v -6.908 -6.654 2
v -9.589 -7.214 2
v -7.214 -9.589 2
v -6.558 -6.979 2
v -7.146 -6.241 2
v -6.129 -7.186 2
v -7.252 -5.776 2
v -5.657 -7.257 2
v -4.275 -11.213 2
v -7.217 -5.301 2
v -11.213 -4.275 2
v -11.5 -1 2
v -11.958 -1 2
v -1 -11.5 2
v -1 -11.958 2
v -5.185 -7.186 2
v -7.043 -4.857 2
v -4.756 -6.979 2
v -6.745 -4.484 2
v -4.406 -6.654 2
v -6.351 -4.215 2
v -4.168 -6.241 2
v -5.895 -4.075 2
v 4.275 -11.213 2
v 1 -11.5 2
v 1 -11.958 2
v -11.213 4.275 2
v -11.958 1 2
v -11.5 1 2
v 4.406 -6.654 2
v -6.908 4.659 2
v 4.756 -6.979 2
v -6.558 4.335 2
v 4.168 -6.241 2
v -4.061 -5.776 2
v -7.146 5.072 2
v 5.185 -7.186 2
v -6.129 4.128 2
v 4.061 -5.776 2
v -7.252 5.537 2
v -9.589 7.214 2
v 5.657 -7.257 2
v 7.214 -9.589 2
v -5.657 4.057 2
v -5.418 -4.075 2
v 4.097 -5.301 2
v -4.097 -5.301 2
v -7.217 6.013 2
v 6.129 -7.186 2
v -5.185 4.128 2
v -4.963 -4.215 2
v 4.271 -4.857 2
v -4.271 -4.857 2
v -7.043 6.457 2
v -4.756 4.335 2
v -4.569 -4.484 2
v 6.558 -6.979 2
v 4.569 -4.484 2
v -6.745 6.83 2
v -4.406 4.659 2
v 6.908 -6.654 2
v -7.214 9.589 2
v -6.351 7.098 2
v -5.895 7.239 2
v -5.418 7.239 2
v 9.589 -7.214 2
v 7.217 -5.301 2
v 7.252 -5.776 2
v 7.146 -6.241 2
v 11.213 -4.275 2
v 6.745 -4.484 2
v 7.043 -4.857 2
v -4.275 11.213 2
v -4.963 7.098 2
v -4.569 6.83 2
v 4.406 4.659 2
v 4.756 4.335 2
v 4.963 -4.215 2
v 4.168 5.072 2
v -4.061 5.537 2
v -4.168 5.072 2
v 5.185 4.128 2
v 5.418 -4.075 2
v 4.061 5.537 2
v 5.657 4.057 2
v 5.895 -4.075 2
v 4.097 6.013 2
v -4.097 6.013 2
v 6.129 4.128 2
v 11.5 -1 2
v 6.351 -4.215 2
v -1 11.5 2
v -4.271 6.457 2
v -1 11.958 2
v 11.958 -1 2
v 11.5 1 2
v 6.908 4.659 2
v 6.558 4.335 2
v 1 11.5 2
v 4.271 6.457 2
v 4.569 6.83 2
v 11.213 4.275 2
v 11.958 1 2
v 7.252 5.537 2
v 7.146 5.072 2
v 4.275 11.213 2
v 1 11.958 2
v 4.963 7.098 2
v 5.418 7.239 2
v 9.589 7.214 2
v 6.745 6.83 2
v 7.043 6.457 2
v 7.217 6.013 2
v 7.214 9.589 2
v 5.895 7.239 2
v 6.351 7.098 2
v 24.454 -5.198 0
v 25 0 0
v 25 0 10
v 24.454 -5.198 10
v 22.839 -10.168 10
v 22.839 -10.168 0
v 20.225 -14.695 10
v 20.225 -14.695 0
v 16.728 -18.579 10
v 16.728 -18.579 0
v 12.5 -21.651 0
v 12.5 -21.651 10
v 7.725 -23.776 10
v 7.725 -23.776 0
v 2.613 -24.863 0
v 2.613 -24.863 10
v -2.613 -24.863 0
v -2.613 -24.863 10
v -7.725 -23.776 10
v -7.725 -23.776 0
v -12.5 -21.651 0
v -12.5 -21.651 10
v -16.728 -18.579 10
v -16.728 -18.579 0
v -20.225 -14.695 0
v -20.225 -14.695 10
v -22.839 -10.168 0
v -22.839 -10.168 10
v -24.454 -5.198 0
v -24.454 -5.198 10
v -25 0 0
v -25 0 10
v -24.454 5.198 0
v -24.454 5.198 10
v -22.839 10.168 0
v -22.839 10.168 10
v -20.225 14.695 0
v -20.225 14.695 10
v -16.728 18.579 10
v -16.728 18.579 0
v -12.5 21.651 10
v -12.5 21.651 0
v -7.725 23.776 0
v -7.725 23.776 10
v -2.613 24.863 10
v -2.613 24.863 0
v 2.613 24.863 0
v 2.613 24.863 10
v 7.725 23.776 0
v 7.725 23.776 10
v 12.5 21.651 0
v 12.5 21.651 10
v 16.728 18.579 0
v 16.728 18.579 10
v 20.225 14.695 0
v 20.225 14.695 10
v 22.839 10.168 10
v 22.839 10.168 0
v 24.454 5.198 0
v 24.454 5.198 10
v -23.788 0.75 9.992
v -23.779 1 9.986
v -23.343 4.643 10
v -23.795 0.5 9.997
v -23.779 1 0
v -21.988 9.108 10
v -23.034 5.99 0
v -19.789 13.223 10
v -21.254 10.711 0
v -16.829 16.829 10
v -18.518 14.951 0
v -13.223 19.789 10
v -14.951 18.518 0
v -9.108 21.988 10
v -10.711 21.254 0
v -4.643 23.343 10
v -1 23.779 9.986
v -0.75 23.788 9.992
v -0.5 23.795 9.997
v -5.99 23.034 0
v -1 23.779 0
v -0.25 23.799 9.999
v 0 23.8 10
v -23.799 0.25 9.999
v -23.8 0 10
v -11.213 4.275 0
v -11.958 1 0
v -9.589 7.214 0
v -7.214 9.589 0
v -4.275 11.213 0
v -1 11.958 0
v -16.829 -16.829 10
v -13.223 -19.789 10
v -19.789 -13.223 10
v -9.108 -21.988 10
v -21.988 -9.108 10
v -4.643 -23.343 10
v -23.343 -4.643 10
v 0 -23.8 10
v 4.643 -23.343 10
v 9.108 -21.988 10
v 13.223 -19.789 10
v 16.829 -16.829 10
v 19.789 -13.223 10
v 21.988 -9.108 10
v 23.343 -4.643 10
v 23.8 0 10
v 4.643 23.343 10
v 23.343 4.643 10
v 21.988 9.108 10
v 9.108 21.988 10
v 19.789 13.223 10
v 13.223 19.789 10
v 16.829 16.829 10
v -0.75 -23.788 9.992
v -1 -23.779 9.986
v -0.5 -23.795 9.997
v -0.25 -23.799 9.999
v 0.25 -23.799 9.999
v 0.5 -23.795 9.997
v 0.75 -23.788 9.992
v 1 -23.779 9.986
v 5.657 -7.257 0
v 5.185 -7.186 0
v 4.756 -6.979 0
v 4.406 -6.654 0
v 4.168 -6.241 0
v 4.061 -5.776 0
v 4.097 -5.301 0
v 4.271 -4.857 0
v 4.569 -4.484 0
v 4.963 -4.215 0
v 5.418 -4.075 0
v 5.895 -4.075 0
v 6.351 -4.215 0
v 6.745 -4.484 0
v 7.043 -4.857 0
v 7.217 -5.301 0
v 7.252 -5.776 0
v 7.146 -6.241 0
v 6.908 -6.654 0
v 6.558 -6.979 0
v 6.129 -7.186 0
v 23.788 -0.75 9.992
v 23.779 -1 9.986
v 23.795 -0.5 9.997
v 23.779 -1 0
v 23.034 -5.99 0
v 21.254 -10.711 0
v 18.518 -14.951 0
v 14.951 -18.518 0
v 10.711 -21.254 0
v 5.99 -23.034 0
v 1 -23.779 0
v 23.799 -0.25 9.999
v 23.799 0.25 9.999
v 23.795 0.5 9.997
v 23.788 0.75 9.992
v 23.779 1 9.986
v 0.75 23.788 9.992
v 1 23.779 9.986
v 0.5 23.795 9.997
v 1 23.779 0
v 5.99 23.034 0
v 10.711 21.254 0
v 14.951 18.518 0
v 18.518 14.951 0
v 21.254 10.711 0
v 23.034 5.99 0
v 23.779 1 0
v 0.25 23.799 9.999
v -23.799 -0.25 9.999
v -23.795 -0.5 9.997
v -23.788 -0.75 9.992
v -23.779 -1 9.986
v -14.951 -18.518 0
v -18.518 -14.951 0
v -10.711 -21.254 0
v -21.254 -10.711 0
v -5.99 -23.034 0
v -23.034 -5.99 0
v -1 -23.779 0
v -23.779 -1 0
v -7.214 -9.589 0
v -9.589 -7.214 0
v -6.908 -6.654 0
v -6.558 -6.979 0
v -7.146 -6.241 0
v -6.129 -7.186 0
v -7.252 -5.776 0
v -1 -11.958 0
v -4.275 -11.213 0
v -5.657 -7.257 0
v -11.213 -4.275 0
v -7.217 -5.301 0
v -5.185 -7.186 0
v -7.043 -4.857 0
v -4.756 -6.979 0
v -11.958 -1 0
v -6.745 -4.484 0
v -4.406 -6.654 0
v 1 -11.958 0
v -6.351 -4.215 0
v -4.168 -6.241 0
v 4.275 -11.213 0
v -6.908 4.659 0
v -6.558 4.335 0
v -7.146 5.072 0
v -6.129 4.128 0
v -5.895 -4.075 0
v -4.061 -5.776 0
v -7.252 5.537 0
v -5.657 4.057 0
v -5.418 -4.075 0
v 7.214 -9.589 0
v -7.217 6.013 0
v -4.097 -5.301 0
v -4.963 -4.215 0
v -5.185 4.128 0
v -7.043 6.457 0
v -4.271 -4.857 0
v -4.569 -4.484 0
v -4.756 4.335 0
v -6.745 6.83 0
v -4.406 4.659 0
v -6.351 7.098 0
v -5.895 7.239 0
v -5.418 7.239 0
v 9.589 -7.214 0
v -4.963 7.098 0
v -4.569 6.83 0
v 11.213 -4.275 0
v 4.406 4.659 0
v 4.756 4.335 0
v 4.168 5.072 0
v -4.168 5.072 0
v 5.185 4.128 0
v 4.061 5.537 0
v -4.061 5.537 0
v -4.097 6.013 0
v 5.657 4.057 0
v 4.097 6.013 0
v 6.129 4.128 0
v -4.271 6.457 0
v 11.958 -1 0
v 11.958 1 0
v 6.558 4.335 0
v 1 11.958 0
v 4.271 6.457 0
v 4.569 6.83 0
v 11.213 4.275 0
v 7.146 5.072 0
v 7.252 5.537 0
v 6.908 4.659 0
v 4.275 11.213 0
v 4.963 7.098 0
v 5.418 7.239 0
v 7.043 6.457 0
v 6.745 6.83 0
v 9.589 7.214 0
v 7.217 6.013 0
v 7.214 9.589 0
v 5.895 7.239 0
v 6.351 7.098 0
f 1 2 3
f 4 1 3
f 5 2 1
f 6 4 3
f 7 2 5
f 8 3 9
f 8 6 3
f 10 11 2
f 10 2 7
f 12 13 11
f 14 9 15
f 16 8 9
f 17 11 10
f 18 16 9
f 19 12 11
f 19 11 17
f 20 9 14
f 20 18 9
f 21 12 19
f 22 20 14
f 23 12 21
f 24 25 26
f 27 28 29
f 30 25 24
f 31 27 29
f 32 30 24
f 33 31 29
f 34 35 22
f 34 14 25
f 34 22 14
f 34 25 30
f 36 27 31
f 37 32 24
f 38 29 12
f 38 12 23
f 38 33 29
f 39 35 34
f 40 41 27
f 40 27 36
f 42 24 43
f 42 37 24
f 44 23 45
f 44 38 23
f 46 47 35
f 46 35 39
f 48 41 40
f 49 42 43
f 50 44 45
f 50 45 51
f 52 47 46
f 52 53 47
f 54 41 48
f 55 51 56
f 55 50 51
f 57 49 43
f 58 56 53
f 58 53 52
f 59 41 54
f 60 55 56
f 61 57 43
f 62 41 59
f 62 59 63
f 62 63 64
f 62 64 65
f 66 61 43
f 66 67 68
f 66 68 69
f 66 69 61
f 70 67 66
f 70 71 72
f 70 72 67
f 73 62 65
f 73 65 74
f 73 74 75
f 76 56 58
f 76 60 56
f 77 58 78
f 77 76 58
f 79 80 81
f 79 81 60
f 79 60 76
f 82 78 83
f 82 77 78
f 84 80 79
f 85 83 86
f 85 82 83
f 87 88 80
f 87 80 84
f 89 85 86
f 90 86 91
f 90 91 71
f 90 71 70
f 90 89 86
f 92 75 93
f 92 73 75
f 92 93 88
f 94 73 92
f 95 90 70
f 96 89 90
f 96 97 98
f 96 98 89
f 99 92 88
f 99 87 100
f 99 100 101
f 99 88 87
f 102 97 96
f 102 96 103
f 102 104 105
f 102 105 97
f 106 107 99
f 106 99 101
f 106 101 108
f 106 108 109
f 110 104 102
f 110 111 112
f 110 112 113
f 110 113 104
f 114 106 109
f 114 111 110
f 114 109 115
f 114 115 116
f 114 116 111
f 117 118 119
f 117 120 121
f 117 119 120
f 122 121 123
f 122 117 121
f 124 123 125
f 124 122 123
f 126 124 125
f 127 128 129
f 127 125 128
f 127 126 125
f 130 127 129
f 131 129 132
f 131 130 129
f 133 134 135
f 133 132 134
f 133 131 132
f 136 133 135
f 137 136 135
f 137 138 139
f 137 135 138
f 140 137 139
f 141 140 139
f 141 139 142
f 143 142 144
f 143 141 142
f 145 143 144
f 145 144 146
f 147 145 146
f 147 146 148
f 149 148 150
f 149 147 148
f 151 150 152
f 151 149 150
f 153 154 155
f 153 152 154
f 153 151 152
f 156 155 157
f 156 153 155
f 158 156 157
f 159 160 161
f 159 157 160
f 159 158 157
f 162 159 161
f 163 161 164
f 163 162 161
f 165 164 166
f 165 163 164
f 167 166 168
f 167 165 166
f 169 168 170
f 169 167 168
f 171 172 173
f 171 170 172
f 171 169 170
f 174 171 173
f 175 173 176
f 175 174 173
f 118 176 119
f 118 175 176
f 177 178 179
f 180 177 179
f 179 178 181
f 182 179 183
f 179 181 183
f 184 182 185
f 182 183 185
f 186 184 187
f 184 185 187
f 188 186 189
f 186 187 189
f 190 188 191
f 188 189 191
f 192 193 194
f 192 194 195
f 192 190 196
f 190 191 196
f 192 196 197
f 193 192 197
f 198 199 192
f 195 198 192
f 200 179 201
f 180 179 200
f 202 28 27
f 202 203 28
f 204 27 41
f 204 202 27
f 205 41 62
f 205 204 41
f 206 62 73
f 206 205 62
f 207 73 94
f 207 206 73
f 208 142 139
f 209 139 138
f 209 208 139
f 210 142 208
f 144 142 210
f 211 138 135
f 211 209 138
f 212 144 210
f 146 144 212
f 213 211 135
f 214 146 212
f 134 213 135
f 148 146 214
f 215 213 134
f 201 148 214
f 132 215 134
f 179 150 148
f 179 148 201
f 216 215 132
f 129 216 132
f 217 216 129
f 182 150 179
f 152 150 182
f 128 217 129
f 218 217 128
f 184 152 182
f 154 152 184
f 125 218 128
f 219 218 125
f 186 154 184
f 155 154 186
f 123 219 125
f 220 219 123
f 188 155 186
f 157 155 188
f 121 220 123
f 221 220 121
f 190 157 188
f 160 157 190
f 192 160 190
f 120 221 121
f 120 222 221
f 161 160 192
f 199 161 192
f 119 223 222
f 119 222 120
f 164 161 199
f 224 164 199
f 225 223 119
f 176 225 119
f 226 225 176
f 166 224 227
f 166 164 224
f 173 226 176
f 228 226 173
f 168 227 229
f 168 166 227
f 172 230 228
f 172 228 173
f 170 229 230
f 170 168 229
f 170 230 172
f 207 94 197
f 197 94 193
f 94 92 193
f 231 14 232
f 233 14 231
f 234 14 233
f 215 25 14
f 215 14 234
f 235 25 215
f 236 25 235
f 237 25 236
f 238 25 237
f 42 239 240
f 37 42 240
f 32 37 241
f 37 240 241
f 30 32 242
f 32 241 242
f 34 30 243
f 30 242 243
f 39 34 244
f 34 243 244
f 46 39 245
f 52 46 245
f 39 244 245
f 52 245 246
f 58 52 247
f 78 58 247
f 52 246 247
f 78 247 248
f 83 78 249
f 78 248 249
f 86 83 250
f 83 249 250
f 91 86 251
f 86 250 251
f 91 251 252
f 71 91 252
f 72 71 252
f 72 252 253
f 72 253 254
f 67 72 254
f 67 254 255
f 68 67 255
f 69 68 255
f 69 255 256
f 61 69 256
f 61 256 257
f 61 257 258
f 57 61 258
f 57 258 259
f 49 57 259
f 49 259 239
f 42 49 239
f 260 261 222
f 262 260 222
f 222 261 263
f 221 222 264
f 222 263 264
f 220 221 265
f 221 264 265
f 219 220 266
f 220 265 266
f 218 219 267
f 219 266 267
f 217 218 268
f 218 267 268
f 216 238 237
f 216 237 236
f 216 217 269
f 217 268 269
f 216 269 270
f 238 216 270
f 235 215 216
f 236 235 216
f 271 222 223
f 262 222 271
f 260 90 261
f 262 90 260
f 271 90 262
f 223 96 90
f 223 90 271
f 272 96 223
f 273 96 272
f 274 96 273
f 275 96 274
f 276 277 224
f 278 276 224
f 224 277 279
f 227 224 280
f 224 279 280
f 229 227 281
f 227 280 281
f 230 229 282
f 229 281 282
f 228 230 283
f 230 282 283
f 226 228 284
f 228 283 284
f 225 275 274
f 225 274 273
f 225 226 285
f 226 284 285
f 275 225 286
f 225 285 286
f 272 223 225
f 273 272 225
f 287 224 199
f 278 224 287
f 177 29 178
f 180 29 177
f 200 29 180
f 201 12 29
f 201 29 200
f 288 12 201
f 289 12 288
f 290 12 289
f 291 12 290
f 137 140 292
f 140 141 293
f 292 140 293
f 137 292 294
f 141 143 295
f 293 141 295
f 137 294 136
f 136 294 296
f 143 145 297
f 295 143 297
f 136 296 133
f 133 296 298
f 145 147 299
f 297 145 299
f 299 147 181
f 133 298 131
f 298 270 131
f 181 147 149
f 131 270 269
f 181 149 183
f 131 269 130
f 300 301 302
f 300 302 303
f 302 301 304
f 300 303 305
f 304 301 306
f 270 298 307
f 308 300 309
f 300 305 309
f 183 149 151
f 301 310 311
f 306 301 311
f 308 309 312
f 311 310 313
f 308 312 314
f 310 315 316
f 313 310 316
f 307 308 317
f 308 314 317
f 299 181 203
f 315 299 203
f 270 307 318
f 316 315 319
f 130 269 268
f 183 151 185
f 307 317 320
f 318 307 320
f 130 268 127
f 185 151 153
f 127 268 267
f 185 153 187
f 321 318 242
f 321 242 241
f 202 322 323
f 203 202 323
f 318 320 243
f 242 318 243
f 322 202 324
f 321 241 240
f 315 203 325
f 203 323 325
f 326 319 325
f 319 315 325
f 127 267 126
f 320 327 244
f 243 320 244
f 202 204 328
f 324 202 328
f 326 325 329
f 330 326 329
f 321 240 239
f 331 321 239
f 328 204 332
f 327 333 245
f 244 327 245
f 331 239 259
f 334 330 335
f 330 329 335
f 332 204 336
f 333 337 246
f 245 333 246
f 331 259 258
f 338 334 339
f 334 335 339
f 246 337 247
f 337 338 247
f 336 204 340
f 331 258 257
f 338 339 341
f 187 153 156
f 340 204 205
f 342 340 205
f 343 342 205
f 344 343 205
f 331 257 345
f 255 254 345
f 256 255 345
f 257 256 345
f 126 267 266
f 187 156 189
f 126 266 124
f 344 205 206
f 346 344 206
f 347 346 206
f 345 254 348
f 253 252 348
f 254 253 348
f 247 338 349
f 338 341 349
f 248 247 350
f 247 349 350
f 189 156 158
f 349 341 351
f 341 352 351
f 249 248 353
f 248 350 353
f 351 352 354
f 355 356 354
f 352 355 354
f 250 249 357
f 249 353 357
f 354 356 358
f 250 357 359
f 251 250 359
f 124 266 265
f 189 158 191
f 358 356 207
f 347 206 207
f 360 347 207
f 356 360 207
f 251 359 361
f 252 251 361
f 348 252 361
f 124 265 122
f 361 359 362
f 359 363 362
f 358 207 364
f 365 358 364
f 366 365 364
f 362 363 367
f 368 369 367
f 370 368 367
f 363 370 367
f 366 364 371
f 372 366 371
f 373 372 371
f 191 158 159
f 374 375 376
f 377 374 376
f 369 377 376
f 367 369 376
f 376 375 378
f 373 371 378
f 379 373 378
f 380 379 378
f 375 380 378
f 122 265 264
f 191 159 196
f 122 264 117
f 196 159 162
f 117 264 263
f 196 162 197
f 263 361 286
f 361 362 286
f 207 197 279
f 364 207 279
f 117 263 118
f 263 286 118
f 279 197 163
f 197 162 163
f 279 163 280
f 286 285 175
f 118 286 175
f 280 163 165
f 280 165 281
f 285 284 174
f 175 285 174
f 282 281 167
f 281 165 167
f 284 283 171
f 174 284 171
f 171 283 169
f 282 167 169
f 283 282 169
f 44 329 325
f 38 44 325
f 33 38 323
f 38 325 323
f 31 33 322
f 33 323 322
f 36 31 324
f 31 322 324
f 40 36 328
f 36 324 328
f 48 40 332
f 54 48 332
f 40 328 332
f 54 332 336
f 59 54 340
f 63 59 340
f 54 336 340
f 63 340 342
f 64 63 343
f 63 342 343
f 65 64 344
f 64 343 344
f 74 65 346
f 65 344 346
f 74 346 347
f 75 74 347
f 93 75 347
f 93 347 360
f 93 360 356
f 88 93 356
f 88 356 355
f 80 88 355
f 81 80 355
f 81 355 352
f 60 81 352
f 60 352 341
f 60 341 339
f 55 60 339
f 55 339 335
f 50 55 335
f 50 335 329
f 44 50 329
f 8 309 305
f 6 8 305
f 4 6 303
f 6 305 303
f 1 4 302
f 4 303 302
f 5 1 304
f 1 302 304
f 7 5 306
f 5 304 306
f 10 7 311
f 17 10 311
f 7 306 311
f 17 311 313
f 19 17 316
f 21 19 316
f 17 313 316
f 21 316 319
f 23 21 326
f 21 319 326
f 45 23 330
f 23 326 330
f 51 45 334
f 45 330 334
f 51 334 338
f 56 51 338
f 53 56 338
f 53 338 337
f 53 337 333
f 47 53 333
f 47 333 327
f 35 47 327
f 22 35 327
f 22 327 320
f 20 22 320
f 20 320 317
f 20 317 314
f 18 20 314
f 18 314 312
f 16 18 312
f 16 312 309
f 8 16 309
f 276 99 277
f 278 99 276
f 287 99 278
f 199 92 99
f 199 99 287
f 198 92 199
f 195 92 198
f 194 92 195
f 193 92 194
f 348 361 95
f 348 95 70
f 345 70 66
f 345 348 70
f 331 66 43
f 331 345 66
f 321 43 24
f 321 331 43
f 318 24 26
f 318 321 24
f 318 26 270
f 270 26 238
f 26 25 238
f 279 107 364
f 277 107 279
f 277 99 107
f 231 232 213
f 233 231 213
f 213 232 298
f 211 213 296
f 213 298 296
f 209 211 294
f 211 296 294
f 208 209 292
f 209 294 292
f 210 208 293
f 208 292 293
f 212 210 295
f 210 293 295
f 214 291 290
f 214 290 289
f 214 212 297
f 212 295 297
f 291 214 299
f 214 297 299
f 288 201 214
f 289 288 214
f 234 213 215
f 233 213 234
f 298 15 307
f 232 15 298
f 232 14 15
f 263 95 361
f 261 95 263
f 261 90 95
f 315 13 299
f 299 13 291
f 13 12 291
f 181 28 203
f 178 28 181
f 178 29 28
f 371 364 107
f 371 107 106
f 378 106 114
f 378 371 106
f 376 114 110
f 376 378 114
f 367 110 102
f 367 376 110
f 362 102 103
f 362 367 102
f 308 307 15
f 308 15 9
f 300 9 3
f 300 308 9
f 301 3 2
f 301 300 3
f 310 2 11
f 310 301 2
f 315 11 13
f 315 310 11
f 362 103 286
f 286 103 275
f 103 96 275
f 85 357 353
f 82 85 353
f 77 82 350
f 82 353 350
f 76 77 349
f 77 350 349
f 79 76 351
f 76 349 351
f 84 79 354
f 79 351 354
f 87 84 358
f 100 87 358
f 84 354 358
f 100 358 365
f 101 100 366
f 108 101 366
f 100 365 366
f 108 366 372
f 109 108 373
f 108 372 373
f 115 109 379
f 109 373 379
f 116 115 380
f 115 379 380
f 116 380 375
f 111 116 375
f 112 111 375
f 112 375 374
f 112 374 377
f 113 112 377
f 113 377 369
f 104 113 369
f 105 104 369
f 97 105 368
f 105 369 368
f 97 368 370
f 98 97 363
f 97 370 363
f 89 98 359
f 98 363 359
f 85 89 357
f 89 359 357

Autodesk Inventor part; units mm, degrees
ref_plane "YZ Plane" through (0, 0, 0) normal (1, 0, 0) x (0, 1, 0)
ref_plane "XZ Plane" through (0, 0, 0) normal (0, 1, 0) x (-1, 0, 0)
ref_plane "XY Plane" through (0, 0, 0) normal (0, 0, 1) x (1, 0, 0)
sketch "スケッチ1" plane through (0, 0, 0) normal (0, 0, 1) x (1, 0, 0)
  circle A0 centre (0, 0) radius 12
  dimension "d0" = 24
extrude "ハブ" add sketch "スケッチ1" along normal blind 2
sketch "スケッチ2" plane through (0, 0, 0) normal (0, 0, 1) x (1, 0, 0)
  circle A0 centre (0, 0) radius 25
  circle A1 centre (0, 0) radius 23.8
  dimension "d3" = 50
  dimension "d4" = 1.2
extrude "リム" add sketch "スケッチ2" along normal blind 10
sketch "スケッチ5" plane through (0, 0, 0) normal (1, 0, 0) x (0, 1, 0)
  line L0 (23.8, 10) -> (23.8, 0) projected
  line L1 (23.8, 10) -> (23.8, 0)
  line L2 (23.8, 0) -> (11.5, 0)
  line L3 (25, 0) -> (-25, 0) projected
  line L4 (11.5, 0) -> (11.5, 2)
  line L5 (11.5, 2) -> (23.8, 10)
  line L6 (12, 2) -> (-12, 2) projected
  point P0 (0, 0)
  point P1 (0, 0)
  dimension "d10" = 11.5
extrude "スポーク" add sketch "スケッチ5" along normal mid plane 2
pattern_circular "円形状パターン1" count 4 over 360 about axis through (0, 0, -10) along (0, 0, 1) of "スポーク"
sketch "スケッチ6" plane through (0, 0, 2) normal (0, 0, 1) x (1, 0, 0)
  circle A0 centre (0, 0) radius 8 construction
  line L0 (-13.4189, -13.4189) -> (13.4189, 13.4189) construction
  line L1 (-15.0493, 15.0493) -> (15.0493, -15.0493) construction
  line L2 (-16.6434, 0) -> (16.6434, 0) construction
  point P0 (5.6569, 5.6569)
  point P1 (-5.6569, 5.6569)
  point P2 (-5.6569, -5.6569)
  point P3 (5.6569, -5.6569)
  dimension "d16" = 16
  dimension "d17" = 45
  dimension "d18" = 45
hole "穴1" at (5.6569, 5.6569, 2) at (-5.6569, 5.6569, 2) at (-5.6569, -5.6569, 2) at (5.6569, -5.6569, 2) direction (0, 0, -1) diameter 3.2 end through all
equation "\"d18\" = d17"
properties part number "Wheel-D50A"
